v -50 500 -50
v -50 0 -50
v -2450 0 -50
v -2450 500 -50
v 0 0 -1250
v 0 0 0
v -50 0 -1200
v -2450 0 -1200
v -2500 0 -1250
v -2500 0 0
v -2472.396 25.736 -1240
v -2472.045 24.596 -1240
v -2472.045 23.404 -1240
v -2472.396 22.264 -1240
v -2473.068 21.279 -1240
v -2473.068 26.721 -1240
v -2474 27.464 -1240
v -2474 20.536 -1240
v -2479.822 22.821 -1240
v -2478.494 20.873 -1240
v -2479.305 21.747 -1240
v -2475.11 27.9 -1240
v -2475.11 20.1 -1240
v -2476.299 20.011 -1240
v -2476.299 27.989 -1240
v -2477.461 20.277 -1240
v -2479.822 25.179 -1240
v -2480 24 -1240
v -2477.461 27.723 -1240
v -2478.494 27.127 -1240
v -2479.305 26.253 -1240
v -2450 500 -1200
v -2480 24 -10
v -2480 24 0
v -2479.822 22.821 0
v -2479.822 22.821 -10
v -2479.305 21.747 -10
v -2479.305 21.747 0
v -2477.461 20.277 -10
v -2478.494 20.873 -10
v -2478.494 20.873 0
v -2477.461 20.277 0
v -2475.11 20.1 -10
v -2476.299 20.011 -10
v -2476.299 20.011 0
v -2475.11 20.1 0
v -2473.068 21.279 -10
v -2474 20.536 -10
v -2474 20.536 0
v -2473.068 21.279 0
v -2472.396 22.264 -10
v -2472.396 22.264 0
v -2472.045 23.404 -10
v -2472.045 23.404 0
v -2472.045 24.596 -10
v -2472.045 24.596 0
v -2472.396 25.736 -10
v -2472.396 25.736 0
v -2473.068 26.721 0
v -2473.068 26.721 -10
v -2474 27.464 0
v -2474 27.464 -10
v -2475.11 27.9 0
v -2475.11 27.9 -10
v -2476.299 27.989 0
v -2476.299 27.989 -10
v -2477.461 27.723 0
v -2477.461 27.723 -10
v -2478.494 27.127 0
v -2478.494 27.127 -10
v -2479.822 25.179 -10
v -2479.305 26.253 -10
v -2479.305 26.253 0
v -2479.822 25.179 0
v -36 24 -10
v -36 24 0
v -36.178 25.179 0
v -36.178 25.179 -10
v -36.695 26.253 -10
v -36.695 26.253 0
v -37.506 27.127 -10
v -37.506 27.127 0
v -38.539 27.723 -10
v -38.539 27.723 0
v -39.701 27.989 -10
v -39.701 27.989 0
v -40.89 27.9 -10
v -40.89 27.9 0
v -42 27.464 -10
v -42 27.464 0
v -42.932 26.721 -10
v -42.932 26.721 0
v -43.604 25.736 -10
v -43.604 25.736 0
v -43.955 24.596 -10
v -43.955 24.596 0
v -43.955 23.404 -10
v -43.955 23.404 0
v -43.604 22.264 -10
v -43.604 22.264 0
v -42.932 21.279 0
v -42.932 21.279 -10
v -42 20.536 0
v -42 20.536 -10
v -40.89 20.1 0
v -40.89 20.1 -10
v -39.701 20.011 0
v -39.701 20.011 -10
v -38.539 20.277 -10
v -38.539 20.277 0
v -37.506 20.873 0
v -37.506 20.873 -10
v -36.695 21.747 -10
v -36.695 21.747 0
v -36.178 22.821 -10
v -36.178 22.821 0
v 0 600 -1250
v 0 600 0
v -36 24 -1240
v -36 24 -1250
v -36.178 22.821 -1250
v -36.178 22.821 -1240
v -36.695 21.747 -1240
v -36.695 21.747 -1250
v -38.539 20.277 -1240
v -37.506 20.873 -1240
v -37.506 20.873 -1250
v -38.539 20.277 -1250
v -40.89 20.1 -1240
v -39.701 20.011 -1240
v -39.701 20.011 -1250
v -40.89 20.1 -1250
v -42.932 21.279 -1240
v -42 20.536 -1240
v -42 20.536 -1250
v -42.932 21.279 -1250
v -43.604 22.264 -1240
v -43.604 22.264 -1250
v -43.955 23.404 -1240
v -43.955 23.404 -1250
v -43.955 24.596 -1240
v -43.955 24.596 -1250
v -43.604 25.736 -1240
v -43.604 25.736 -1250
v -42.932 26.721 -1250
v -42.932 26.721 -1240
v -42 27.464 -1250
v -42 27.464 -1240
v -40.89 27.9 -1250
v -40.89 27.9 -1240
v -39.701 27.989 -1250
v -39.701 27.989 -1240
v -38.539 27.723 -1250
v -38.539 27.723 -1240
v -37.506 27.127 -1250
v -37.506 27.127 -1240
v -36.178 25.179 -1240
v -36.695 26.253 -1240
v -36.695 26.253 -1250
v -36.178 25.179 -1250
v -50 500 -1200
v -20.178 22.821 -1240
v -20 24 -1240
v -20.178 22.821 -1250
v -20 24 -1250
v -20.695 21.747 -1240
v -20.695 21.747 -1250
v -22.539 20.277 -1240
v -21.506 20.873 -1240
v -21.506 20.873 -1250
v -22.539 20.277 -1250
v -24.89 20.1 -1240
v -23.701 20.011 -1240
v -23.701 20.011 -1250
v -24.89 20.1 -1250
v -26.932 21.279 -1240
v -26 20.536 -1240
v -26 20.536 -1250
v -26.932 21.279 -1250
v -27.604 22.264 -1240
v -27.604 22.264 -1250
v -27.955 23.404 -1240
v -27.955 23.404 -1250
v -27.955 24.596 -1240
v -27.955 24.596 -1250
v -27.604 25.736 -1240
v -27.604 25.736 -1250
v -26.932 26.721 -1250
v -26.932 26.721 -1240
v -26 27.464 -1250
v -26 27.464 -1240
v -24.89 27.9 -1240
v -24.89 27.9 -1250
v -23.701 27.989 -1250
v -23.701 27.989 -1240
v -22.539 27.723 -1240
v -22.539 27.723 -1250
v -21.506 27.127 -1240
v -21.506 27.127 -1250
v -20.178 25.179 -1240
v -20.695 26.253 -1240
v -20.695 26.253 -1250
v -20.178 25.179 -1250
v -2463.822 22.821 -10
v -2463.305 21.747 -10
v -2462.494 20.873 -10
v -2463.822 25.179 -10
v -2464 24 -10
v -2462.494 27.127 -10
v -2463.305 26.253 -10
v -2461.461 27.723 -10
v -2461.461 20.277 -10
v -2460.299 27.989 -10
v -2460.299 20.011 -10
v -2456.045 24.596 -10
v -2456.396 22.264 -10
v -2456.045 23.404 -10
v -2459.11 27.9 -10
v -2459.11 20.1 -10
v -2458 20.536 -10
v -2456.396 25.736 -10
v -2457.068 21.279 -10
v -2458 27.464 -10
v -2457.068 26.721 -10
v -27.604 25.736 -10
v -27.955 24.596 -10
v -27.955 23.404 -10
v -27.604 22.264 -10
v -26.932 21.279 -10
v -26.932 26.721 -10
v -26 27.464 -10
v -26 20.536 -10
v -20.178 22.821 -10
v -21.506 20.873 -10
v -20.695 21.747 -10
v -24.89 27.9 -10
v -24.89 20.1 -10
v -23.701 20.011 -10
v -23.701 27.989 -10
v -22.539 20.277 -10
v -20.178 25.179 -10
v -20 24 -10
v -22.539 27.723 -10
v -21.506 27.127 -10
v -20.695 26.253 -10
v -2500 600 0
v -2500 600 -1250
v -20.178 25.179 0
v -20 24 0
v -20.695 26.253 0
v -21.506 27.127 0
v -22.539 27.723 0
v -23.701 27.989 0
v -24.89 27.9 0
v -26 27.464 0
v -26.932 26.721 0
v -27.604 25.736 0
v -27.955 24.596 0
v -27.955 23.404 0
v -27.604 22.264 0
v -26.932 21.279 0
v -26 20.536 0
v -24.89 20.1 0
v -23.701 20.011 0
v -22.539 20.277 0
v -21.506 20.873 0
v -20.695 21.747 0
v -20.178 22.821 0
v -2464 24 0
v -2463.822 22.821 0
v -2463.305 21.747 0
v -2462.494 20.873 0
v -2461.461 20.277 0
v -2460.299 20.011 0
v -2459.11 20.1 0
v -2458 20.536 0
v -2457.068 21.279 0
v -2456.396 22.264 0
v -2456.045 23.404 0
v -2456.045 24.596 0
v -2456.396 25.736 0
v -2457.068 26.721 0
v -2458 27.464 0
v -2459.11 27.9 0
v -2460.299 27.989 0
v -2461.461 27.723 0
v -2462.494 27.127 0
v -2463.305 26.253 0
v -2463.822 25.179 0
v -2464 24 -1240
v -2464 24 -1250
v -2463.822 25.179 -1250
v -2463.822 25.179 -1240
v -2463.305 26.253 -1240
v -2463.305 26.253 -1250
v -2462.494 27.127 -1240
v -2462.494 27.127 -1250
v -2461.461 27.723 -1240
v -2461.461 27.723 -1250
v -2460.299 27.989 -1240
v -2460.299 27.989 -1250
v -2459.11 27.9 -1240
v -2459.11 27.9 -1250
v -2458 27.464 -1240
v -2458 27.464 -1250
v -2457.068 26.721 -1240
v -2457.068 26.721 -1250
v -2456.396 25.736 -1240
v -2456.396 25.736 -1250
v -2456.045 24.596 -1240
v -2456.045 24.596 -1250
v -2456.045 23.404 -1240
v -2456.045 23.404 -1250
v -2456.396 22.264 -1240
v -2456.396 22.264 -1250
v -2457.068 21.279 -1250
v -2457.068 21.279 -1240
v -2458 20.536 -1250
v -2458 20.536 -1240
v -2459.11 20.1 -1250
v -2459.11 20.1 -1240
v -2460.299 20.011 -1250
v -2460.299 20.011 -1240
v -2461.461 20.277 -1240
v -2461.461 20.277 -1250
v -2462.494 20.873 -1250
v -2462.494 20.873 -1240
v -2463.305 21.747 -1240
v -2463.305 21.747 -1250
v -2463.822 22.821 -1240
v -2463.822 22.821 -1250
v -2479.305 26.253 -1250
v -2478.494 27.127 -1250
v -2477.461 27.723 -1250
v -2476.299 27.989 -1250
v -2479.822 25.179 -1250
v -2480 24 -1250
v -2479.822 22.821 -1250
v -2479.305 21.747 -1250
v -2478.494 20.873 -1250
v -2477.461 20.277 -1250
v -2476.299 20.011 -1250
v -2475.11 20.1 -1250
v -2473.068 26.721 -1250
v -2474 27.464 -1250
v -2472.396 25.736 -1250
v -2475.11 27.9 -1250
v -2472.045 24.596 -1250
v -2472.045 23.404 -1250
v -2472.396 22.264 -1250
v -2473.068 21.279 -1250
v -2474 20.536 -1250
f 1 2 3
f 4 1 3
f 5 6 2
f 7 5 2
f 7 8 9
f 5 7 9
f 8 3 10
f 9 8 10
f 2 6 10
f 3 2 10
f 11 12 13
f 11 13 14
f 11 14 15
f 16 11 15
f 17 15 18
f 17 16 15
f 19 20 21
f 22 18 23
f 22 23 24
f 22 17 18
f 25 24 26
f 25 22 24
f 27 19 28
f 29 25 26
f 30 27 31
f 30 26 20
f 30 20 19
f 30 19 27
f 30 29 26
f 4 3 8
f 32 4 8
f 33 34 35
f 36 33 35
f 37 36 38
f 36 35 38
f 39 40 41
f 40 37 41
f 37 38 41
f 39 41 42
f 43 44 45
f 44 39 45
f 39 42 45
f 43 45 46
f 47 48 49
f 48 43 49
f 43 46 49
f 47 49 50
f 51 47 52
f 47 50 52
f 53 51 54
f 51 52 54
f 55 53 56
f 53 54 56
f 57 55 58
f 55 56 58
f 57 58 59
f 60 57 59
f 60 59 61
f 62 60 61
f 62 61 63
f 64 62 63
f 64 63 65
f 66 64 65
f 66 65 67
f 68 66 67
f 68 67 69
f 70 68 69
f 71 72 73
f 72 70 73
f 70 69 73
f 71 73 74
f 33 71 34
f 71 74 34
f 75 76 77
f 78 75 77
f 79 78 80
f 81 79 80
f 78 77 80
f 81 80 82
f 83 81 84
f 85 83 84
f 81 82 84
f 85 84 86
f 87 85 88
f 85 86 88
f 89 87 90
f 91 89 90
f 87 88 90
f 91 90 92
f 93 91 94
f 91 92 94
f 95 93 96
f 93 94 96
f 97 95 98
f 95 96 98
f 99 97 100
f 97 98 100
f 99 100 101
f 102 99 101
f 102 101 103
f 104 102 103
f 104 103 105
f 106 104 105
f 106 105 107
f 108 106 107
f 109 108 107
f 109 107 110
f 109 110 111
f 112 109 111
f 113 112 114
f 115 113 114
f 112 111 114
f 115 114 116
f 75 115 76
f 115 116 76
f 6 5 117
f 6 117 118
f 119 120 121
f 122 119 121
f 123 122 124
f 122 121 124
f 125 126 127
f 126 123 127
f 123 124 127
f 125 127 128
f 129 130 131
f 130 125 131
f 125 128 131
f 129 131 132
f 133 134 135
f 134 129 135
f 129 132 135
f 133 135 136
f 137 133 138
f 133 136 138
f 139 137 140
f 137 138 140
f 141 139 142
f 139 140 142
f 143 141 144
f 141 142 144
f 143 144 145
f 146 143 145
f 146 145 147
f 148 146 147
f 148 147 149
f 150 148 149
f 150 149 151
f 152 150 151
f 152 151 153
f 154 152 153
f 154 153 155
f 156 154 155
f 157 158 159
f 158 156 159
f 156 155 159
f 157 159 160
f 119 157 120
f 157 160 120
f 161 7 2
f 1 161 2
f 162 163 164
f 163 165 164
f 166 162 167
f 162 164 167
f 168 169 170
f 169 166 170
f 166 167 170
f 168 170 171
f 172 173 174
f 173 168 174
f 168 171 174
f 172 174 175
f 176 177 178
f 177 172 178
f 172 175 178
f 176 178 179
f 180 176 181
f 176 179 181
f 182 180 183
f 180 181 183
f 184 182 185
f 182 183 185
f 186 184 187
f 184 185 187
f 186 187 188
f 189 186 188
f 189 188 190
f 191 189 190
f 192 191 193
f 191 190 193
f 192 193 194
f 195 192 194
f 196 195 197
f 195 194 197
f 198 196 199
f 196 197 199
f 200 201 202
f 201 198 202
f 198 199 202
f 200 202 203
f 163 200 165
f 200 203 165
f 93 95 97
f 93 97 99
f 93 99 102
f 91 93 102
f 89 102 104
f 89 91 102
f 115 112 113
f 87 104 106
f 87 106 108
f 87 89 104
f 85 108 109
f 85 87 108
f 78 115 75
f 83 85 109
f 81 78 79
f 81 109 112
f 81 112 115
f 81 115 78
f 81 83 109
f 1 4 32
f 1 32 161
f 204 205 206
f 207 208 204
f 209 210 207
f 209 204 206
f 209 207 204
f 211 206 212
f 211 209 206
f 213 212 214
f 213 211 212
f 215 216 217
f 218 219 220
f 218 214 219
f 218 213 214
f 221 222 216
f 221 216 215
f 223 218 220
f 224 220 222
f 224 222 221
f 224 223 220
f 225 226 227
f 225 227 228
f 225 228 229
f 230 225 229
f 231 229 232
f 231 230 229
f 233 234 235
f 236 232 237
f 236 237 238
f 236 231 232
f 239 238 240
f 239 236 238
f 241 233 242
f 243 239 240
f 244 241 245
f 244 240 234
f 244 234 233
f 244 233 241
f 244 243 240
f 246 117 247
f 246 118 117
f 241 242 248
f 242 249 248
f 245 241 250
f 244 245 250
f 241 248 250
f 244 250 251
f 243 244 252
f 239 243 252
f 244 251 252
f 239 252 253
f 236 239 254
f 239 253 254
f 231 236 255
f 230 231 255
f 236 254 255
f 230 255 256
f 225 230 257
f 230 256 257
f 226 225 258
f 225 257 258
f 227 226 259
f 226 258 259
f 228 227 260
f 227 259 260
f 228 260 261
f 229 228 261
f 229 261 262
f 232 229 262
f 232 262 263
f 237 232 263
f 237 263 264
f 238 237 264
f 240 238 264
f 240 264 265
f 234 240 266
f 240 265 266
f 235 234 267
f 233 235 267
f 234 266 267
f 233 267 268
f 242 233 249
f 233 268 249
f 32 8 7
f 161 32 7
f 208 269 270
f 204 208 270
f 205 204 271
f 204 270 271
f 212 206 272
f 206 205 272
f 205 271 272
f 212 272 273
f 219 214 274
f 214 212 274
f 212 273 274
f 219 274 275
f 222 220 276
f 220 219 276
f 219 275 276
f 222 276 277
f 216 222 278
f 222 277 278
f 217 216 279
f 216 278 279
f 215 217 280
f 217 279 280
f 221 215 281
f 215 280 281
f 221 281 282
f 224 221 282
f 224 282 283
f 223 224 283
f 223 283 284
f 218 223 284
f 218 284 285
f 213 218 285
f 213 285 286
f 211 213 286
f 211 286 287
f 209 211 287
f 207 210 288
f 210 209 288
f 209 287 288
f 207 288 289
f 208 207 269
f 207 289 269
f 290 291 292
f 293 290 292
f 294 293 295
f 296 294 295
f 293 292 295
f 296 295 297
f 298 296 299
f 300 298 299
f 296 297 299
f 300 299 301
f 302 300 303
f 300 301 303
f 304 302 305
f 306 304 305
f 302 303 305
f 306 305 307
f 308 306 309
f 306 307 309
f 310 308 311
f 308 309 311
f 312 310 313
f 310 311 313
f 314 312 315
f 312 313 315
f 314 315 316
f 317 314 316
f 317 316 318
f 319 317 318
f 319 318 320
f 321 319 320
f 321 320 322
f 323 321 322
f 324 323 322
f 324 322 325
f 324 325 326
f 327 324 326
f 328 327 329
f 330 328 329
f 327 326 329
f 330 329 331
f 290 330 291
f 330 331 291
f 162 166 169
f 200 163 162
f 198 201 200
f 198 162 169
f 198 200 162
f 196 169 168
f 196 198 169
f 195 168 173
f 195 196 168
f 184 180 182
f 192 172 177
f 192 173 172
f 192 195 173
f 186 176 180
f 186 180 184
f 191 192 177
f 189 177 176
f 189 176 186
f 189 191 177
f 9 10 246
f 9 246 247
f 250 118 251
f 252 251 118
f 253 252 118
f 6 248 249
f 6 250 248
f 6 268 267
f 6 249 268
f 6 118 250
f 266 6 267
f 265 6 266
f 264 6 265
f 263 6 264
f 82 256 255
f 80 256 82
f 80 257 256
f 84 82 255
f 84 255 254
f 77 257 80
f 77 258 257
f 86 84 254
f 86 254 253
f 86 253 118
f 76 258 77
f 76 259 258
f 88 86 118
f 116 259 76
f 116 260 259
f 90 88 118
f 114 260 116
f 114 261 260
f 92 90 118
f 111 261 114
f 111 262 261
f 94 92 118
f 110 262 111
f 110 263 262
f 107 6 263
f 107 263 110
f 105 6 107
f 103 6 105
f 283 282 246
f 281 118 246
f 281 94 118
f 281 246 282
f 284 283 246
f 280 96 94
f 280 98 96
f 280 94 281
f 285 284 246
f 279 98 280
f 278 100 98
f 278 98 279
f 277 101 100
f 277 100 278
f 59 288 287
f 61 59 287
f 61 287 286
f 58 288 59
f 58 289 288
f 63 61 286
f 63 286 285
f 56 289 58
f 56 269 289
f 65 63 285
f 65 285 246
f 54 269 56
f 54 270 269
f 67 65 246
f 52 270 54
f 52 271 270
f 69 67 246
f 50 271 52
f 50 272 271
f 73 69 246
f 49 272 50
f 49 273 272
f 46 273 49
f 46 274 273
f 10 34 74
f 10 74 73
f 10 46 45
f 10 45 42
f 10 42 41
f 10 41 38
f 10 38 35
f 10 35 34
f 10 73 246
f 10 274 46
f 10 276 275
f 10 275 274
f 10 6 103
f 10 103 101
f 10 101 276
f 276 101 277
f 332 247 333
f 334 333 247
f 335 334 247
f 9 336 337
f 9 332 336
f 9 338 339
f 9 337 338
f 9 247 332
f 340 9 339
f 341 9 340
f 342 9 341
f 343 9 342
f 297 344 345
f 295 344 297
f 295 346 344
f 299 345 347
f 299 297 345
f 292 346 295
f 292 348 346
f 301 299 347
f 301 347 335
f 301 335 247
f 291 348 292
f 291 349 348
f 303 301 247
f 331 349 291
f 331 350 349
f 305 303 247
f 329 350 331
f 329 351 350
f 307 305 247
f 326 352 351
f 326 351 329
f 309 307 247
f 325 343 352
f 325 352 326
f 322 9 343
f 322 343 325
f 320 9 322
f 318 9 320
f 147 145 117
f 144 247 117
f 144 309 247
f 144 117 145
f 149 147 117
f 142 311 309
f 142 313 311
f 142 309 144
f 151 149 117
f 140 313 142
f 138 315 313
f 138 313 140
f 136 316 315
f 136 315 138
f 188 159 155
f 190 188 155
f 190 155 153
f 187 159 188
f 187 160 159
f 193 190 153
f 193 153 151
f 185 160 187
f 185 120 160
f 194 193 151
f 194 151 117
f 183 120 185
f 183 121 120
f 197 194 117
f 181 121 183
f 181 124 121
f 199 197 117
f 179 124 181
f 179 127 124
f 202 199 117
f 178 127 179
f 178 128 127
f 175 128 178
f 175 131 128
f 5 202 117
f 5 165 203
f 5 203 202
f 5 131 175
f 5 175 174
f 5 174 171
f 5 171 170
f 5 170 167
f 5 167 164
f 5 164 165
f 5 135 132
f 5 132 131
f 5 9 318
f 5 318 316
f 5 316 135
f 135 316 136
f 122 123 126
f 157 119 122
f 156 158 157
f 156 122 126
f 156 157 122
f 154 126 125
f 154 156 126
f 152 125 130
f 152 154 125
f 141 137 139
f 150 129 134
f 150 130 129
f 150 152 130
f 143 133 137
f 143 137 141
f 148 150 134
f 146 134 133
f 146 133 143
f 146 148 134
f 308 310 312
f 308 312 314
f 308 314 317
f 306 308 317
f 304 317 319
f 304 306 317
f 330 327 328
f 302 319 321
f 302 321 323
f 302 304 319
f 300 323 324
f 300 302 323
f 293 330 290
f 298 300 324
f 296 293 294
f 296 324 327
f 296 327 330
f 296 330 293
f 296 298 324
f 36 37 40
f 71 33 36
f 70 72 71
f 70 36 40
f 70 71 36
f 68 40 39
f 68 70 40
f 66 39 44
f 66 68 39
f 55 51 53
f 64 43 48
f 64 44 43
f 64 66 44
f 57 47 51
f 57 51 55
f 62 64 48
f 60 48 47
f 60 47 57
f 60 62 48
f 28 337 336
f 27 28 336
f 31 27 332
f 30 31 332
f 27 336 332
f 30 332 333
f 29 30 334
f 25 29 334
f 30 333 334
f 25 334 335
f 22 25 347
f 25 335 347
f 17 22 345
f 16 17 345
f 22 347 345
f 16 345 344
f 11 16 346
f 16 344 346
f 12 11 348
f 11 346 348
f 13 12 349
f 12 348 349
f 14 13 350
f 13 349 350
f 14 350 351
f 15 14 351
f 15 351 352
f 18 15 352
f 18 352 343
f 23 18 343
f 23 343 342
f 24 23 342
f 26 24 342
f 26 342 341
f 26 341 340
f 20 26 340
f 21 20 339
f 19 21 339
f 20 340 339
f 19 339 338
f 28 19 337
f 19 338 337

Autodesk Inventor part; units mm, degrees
ref_plane "YZ Plane" through (0, 0, 0) normal (1, 0, 0) x (0, 1, 0)
ref_plane "XZ Plane" through (0, 0, 0) normal (0, 1, 0) x (-1, 0, 0)
ref_plane "XY Plane" through (0, 0, 0) normal (0, 0, 1) x (1, 0, 0)
sketch "Sketch1" plane through (0, 0, 0) normal (0, 1, 0) x (-1, 0, 0)
  line L0 (0, 0) -> (2500, 0)
  line L1 (2500, 0) -> (2500, -1250)
  line L2 (2500, -1250) -> (0, -1250)
  line L3 (0, -1250) -> (0, 0)
  dimension "d0" = 2500
  dimension "d1" = 1250
extrude "Extrusion1" add sketch "Sketch1" along normal blind 600
sketch "Sketch2" plane through (0, 0, 0) normal (0, -1, 0) x (1, 0, 0)
  line L0 (-50, -50) -> (-2450, -50)
  line L1 (-2450, -50) -> (-2450, -1200)
  line L2 (-2450, -1200) -> (-50, -1200)
  line L3 (-50, -1200) -> (-50, -50)
  line L4 (0, 0) -> (-2500, 0) projected
  line L5 (0, -1250) -> (0, 0) projected
  dimension "d4" = 2400
  dimension "d5" = 1150
  dimension "d8" = 50
  dimension "d9" = 50
  dimension "d10" = 2500
  dimension "d11" = 1250
extrude "Extrusion2" cut sketch "Sketch2" against normal blind 500
sketch "Sketch3" plane through (-2500, 0, 0) normal (0, 0, 1) x (1, 0, 0)
  line L0 (2500, 0) -> (0, 0) projected
  line L1 (2500, 0) -> (2500, 600) projected
  line L2 (0, 0) -> (0, 600) projected
  circle A0 centre (2476, 24) radius 4
  circle A1 centre (2460, 24) radius 4
  dimension "d12" = 8
  dimension "d13" = 24
  dimension "d14" = 24
  dimension "d20" = 8
  dimension "d21" = 24
  dimension "d23" = 16
extrude "Extrusion3" cut sketch "Sketch3" against normal blind 10
ref_plane "Work Plane1" through (-2500, 0, -625) normal (0, 0, 1) x (1, 0, 0)
mirror "Mirror1" about plane through (-2500, 0, -625) normal (0, 0, 1) of "Extrusion3"
ref_plane "Work Plane2" through (-1250, 0, -1250) normal (-1, 0, 0) x (0, 0, 1)
mirror "Mirror2" about plane through (-1250, 0, -1250) normal (-1, 0, 0) of "Extrusion3"
mirror "Mirror3" about plane through (-2500, 0, -625) normal (0, 0, 1) of "Mirror2", "Extrusion3"
equation "\"d0\" = 2 * d1"
equation "\"d4\" = d10 - 2 * d9"
equation "\"d5\" = d11 - 2 * d8"
equation "\"d9\" = d8"
equation "\"d13\" = 3 * d12"
equation "\"d14\" = 3 * d12"
equation "\"d20\" = d12"
equation "\"d21\" = d13"
equation "\"d23\" = 2 * d12"
properties part number "Base" material "Wood (Birch)"
